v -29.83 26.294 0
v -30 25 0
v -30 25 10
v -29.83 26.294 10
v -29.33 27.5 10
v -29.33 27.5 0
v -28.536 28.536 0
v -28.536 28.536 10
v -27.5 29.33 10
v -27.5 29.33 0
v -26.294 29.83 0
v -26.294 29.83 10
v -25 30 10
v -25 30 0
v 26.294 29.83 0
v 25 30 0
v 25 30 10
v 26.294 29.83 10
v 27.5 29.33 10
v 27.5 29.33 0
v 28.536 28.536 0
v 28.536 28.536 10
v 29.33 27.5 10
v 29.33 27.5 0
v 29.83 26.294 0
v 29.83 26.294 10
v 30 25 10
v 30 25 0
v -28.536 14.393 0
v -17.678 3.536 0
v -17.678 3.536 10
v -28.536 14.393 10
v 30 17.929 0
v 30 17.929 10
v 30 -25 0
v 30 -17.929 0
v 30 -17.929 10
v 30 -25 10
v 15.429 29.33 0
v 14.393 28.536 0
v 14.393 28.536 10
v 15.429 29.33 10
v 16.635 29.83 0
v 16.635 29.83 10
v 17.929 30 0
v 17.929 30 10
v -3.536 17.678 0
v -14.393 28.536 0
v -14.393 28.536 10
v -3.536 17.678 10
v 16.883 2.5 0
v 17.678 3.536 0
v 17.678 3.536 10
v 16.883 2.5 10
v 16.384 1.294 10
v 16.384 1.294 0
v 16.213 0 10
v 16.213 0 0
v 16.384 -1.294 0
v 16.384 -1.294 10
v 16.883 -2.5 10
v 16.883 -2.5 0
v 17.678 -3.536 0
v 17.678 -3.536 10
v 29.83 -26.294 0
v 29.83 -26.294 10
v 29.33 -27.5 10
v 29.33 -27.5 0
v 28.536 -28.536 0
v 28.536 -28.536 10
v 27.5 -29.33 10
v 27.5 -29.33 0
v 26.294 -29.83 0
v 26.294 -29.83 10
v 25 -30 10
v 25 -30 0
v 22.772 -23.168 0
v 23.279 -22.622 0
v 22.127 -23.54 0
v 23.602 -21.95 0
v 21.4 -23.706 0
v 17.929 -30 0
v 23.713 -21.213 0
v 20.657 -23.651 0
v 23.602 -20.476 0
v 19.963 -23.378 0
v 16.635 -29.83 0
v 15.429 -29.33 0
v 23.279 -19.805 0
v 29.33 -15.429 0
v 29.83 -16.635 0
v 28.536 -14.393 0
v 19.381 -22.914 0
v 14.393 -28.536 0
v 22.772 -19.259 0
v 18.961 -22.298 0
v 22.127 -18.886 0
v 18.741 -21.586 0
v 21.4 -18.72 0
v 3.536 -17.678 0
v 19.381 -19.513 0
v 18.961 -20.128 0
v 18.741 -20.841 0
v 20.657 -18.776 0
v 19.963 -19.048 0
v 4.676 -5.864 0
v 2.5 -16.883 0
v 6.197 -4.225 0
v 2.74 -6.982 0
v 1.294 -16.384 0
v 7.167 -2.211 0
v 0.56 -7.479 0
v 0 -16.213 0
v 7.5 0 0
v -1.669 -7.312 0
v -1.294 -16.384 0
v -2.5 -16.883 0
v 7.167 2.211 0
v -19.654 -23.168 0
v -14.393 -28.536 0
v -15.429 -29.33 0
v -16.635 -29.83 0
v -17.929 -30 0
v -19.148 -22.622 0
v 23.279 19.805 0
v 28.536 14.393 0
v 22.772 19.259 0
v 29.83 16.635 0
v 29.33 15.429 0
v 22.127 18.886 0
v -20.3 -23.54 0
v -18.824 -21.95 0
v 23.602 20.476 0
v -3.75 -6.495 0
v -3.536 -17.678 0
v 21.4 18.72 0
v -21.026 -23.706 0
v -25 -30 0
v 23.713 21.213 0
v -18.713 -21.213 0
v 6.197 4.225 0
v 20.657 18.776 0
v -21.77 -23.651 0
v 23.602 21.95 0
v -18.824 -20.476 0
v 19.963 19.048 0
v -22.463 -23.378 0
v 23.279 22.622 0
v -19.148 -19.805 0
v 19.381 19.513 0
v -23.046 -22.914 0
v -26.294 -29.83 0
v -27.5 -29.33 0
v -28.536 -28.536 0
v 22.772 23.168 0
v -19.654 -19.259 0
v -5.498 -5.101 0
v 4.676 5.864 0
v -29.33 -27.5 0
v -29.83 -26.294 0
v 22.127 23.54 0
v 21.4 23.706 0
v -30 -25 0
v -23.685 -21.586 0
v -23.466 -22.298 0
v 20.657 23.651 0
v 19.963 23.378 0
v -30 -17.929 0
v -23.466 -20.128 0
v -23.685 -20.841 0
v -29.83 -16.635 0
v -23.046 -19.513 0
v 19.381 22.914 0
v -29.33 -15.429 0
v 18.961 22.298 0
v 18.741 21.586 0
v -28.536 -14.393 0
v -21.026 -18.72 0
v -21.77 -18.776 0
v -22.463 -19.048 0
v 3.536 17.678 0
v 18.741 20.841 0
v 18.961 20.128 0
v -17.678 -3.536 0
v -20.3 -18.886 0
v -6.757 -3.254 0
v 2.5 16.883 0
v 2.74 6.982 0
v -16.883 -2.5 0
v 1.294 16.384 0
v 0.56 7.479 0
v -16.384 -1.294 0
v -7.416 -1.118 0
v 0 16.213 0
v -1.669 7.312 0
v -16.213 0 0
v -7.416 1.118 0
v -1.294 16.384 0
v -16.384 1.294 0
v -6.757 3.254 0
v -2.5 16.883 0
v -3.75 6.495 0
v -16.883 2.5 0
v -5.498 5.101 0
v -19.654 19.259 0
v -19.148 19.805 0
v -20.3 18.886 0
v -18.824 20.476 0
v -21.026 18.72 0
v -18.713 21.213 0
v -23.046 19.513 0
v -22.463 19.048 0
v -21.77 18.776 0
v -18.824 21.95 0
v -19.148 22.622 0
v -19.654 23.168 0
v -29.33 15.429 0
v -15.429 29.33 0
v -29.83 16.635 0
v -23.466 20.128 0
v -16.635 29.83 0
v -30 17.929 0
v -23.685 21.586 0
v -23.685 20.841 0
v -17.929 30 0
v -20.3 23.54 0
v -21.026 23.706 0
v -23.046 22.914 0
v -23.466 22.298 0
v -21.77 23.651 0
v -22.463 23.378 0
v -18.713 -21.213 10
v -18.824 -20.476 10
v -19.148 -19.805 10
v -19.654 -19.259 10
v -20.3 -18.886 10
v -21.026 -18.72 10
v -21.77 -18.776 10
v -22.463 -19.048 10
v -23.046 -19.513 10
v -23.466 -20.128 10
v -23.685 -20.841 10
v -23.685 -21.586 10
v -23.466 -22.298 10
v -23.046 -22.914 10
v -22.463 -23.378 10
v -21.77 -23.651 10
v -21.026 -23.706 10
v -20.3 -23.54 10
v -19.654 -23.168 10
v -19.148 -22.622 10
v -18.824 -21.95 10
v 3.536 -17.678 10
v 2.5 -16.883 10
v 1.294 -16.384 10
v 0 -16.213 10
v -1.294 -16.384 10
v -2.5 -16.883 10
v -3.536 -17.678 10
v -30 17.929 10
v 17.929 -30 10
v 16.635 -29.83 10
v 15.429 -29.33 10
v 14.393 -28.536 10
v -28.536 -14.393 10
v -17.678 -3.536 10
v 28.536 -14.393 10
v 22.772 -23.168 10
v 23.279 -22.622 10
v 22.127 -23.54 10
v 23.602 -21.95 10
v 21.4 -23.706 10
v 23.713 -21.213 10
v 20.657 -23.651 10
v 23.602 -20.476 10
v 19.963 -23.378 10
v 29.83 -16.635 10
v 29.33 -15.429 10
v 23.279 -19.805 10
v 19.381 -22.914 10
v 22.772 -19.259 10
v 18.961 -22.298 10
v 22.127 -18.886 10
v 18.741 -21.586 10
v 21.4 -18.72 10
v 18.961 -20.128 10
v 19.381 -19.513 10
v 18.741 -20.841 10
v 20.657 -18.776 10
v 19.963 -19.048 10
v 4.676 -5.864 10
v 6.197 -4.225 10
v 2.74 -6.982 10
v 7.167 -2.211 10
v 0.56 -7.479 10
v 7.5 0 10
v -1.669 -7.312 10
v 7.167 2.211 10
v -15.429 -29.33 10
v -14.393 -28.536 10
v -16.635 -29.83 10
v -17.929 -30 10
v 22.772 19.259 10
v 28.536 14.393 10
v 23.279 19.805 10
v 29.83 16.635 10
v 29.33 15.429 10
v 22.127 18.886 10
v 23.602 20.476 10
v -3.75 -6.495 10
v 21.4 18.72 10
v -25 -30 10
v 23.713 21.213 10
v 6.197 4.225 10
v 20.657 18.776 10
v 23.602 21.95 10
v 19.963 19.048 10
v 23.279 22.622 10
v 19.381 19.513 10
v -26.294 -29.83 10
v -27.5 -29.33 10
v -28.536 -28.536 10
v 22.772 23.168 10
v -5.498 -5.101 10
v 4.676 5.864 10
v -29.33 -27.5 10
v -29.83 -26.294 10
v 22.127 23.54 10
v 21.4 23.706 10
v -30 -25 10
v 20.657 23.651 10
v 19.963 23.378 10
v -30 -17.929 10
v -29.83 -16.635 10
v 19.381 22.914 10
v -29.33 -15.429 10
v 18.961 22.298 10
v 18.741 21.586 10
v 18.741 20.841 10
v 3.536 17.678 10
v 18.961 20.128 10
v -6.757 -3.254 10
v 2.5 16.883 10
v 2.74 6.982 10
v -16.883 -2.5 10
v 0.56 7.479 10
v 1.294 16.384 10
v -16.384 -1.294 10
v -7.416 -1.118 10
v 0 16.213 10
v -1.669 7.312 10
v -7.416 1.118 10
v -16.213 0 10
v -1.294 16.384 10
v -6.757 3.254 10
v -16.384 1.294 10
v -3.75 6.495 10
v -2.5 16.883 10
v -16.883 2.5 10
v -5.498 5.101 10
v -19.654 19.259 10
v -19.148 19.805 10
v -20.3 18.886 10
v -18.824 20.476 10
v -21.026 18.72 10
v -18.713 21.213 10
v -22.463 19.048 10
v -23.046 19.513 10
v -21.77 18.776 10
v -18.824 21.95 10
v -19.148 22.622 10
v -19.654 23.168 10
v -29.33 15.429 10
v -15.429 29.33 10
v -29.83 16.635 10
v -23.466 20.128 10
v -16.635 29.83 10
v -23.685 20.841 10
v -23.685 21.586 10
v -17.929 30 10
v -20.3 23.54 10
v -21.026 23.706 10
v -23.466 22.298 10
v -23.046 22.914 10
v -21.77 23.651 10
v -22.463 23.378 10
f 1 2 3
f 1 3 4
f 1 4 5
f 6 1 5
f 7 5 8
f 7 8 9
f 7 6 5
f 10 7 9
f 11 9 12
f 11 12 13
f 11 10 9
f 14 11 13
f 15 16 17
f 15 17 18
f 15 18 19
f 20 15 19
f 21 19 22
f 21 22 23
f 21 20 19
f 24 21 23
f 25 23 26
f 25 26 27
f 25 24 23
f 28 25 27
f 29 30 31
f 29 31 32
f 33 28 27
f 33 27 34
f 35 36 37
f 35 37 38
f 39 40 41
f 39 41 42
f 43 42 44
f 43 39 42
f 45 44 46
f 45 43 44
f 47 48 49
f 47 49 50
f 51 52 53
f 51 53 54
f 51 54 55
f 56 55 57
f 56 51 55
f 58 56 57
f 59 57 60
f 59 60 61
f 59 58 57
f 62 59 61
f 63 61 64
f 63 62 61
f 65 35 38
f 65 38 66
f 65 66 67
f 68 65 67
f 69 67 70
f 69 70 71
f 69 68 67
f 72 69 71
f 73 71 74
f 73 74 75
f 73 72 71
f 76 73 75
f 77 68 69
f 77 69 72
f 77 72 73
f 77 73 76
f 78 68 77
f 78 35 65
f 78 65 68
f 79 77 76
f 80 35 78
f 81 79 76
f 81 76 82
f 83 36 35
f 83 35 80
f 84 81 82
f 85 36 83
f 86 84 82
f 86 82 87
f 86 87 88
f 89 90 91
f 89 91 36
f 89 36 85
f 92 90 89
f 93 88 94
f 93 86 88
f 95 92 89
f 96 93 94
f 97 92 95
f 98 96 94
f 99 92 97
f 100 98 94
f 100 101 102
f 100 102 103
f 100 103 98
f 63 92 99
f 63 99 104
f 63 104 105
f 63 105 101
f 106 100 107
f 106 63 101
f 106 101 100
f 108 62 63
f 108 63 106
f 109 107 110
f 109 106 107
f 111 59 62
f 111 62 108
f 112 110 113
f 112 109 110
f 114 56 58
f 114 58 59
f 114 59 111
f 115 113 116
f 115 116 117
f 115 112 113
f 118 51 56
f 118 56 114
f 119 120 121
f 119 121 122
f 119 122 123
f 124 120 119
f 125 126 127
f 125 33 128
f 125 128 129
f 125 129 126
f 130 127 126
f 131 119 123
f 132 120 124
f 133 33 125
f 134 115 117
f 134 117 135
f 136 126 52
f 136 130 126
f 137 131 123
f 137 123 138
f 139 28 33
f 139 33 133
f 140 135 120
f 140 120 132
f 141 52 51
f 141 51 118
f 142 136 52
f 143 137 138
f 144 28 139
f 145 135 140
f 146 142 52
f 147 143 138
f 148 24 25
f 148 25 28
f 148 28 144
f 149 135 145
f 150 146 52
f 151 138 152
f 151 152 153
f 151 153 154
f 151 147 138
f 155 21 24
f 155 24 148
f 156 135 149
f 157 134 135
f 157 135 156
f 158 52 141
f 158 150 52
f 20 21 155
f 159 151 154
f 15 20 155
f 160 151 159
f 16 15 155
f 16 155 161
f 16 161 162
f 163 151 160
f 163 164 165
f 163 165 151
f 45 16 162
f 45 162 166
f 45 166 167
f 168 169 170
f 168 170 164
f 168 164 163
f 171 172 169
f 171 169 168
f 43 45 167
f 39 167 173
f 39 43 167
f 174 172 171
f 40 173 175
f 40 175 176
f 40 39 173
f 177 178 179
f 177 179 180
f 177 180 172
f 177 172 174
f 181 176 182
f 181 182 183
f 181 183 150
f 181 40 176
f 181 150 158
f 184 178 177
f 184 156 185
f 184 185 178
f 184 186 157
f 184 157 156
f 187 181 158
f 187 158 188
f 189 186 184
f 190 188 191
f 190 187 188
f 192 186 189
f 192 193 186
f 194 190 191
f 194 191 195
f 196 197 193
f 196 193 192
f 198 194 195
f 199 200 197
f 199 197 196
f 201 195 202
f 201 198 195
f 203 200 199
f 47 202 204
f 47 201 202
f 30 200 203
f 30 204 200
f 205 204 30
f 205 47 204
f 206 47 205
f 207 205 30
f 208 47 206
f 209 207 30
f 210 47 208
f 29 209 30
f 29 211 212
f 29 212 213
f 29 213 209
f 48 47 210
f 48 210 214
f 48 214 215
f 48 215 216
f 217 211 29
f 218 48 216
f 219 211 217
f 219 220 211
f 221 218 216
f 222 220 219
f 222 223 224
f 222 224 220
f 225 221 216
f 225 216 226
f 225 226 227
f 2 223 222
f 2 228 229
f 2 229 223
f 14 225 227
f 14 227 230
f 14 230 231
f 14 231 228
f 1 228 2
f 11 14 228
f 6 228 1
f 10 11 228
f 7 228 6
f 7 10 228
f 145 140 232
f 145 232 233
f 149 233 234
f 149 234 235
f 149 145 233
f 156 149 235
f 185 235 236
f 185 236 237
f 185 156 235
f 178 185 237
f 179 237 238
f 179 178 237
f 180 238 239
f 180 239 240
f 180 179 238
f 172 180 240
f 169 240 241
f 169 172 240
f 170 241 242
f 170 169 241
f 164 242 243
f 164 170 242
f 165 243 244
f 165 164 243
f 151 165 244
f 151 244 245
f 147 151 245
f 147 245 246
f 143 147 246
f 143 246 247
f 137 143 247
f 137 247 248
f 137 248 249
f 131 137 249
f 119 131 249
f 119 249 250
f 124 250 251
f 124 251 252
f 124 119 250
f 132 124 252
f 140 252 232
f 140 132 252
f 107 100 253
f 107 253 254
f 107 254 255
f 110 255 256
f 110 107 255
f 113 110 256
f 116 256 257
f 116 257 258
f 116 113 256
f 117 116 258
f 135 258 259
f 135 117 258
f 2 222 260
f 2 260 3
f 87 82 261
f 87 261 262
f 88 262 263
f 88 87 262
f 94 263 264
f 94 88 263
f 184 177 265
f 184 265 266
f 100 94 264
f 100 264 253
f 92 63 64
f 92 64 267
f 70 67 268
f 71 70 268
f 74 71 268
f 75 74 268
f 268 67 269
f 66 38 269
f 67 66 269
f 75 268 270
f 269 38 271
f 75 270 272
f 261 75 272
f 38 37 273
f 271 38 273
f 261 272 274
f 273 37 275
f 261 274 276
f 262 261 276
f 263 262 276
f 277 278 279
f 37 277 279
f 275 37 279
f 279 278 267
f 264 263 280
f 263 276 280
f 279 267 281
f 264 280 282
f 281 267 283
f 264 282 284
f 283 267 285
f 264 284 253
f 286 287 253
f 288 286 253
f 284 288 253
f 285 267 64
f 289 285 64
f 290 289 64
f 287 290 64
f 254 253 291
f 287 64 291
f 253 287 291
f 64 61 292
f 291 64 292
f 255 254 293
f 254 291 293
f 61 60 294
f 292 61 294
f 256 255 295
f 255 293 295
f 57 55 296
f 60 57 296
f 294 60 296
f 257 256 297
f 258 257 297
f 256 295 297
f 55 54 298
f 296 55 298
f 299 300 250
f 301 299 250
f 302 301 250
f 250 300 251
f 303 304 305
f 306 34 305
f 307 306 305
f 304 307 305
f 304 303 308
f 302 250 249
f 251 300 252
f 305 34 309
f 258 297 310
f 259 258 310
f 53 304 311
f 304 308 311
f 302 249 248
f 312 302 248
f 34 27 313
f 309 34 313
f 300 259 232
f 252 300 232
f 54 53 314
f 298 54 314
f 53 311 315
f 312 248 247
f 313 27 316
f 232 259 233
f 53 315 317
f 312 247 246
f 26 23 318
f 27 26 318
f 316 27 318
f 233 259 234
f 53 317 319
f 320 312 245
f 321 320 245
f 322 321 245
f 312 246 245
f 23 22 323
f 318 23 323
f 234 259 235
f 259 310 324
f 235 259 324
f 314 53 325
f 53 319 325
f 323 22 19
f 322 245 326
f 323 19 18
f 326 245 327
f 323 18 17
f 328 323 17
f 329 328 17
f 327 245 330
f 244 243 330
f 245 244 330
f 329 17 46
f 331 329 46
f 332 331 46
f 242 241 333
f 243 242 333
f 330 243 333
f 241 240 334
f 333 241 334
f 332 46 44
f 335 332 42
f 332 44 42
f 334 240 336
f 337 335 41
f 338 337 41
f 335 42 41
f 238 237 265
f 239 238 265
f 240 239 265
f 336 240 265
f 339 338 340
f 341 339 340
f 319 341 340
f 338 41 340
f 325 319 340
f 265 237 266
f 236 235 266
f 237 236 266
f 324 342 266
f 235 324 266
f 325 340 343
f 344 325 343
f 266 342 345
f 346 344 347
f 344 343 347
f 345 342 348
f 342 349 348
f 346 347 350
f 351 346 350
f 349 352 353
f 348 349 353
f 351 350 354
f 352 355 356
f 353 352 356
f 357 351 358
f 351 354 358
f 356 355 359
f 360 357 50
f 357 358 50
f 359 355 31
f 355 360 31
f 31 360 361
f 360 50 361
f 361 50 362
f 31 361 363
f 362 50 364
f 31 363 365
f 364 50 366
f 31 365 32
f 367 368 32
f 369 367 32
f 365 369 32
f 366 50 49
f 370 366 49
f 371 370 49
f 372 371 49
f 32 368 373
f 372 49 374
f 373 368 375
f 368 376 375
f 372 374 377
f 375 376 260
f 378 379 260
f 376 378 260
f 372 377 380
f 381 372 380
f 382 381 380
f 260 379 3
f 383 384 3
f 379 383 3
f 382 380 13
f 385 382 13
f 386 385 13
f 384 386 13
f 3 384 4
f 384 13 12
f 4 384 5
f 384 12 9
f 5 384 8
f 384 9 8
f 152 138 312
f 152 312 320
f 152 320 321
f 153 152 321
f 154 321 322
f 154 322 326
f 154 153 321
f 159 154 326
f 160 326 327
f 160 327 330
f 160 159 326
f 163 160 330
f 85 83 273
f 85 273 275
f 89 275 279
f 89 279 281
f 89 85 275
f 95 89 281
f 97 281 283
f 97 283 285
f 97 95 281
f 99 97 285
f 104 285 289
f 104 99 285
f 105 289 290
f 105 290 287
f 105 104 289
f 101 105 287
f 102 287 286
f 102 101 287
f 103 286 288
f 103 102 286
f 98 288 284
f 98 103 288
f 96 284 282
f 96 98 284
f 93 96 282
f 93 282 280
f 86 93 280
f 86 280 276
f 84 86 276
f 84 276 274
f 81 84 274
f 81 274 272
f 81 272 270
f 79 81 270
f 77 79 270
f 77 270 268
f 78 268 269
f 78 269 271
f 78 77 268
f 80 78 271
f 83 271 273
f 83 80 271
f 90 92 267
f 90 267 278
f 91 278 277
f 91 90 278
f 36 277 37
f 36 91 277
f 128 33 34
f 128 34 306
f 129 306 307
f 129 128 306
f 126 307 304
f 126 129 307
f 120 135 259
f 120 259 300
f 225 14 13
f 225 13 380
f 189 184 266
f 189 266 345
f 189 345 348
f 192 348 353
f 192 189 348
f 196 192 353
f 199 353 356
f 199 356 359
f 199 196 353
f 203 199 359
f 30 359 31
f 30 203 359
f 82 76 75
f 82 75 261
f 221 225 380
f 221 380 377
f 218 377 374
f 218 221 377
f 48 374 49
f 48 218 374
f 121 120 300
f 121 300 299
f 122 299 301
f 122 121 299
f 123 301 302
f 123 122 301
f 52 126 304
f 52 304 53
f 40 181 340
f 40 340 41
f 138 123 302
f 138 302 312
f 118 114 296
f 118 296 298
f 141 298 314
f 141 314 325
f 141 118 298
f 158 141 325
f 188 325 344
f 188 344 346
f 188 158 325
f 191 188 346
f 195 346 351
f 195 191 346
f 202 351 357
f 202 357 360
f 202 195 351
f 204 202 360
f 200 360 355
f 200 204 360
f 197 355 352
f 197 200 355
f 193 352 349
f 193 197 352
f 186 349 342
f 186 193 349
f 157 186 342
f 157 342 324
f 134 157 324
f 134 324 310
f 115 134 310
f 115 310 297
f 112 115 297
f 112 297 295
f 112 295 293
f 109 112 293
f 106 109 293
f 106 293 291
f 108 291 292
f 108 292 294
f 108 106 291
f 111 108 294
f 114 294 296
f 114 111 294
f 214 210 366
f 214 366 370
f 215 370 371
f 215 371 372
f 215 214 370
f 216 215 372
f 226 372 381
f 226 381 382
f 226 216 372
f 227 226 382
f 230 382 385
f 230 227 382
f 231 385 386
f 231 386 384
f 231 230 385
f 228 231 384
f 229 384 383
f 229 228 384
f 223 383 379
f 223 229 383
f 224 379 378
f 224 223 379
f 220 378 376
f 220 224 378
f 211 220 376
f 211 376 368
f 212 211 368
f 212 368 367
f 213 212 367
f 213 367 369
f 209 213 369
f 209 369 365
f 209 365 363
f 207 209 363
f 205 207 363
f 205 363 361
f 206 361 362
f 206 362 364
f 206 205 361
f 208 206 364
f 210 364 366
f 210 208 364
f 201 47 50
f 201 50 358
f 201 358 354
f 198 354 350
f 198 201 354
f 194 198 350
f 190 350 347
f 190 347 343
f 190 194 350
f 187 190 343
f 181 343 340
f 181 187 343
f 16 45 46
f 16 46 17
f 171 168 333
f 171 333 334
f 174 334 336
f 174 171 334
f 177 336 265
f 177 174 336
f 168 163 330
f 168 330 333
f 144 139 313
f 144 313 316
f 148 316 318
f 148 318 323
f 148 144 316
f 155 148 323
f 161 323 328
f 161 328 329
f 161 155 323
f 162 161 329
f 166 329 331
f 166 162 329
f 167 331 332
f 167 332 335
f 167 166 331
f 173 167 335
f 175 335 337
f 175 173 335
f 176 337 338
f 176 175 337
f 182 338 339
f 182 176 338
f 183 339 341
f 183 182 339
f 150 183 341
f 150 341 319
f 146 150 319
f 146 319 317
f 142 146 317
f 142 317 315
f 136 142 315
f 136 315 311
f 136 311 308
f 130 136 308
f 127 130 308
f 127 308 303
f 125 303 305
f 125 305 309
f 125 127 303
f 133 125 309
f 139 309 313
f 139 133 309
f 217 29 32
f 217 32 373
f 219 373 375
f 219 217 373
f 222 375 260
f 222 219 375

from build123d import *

# Parameters (mm, degrees)
SKETCH1_R           = 2.5
SKETCH1_R_2         = 7.5
BOSS_EXTRUDE1_DEPTH = 10


with BuildPart() as part:
    # Sketch1 → Boss-Extrude1 (new body)
    with BuildSketch(Plane.XY):
        with BuildLine():
            Line((17.928932188, 30), (25, 30))
            ThreePointArc((25, 30), (28.535533906, 28.535533906), (30, 25))
            Line((30, 25), (30, 17.928932188))
            ThreePointArc((30, 17.928932188), (29.619397663, 16.015515026), (28.535533906, 14.393398282))
            Line((28.535533906, 14.393398282), (17.67766953, 3.535533906))
            ThreePointArc((17.67766953, 3.535533906), (16.213203436, 0), (17.67766953, -3.535533906))
            Line((17.67766953, -3.535533906), (28.535533906, -14.393398282))
            ThreePointArc((28.535533906, -14.393398282), (29.619397663, -16.015515026), (30, -17.928932188))
            Line((30, -17.928932188), (30, -25))
            ThreePointArc((30, -25), (28.535533906, -28.535533906), (25, -30))
            Line((25, -30), (17.928932188, -30))
            ThreePointArc((17.928932188, -30), (16.015515026, -29.619397663), (14.393398282, -28.535533906))
            Line((14.393398282, -28.535533906), (3.535533906, -17.67766953))
            ThreePointArc((3.535533906, -17.67766953), (0, -16.213203436), (-3.535533906, -17.67766953))
            Line((-3.535533906, -17.67766953), (-14.393398282, -28.535533906))
            ThreePointArc((-14.393398282, -28.535533906), (-16.015515026, -29.619397663), (-17.928932188, -30))
            Line((-17.928932188, -30), (-25, -30))
            ThreePointArc((-25, -30), (-28.535533906, -28.535533906), (-30, -25))
            Line((-30, -25), (-30, -17.928932188))
            ThreePointArc((-30, -17.928932188), (-29.619397663, -16.015515026), (-28.535533906, -14.393398282))
            Line((-28.535533906, -14.393398282), (-17.67766953, -3.535533906))
            ThreePointArc((-17.67766953, -3.535533906), (-16.213203436, 0), (-17.67766953, 3.535533906))
            Line((-17.67766953, 3.535533906), (-28.535533906, 14.393398282))
            ThreePointArc((-28.535533906, 14.393398282), (-29.619397663, 16.015515026), (-30, 17.928932188))
            Line((-30, 17.928932188), (-30, 25))
            ThreePointArc((-30, 25), (-28.535533906, 28.535533906), (-25, 30))
            Line((-25, 30), (-17.928932188, 30))
            ThreePointArc((-17.928932188, 30), (-16.015515026, 29.619397663), (-14.393398282, 28.535533906))
            Line((-14.393398282, 28.535533906), (-3.535533906, 17.67766953))
            ThreePointArc((-3.535533906, 17.67766953), (0, 16.213203436), (3.535533906, 17.67766953))
            Line((3.535533906, 17.67766953), (14.393398282, 28.535533906))
            ThreePointArc((14.393398282, 28.535533906), (16.015515026, 29.619397663), (17.928932188, 30))
        make_face()
        with Locations((-21.213203436, 21.213203436)):
            Circle(SKETCH1_R, mode=Mode.SUBTRACT)
        with Locations((21.213203436, 21.213203436)):
            Circle(SKETCH1_R, mode=Mode.SUBTRACT)
        with Locations((21.213203436, -21.213203436)):
            Circle(SKETCH1_R, mode=Mode.SUBTRACT)
        with Locations((-21.213203436, -21.213203436)):
            Circle(SKETCH1_R, mode=Mode.SUBTRACT)
        Circle(SKETCH1_R_2, mode=Mode.SUBTRACT)
    extrude(amount=BOSS_EXTRUDE1_DEPTH)


solid = part.part
